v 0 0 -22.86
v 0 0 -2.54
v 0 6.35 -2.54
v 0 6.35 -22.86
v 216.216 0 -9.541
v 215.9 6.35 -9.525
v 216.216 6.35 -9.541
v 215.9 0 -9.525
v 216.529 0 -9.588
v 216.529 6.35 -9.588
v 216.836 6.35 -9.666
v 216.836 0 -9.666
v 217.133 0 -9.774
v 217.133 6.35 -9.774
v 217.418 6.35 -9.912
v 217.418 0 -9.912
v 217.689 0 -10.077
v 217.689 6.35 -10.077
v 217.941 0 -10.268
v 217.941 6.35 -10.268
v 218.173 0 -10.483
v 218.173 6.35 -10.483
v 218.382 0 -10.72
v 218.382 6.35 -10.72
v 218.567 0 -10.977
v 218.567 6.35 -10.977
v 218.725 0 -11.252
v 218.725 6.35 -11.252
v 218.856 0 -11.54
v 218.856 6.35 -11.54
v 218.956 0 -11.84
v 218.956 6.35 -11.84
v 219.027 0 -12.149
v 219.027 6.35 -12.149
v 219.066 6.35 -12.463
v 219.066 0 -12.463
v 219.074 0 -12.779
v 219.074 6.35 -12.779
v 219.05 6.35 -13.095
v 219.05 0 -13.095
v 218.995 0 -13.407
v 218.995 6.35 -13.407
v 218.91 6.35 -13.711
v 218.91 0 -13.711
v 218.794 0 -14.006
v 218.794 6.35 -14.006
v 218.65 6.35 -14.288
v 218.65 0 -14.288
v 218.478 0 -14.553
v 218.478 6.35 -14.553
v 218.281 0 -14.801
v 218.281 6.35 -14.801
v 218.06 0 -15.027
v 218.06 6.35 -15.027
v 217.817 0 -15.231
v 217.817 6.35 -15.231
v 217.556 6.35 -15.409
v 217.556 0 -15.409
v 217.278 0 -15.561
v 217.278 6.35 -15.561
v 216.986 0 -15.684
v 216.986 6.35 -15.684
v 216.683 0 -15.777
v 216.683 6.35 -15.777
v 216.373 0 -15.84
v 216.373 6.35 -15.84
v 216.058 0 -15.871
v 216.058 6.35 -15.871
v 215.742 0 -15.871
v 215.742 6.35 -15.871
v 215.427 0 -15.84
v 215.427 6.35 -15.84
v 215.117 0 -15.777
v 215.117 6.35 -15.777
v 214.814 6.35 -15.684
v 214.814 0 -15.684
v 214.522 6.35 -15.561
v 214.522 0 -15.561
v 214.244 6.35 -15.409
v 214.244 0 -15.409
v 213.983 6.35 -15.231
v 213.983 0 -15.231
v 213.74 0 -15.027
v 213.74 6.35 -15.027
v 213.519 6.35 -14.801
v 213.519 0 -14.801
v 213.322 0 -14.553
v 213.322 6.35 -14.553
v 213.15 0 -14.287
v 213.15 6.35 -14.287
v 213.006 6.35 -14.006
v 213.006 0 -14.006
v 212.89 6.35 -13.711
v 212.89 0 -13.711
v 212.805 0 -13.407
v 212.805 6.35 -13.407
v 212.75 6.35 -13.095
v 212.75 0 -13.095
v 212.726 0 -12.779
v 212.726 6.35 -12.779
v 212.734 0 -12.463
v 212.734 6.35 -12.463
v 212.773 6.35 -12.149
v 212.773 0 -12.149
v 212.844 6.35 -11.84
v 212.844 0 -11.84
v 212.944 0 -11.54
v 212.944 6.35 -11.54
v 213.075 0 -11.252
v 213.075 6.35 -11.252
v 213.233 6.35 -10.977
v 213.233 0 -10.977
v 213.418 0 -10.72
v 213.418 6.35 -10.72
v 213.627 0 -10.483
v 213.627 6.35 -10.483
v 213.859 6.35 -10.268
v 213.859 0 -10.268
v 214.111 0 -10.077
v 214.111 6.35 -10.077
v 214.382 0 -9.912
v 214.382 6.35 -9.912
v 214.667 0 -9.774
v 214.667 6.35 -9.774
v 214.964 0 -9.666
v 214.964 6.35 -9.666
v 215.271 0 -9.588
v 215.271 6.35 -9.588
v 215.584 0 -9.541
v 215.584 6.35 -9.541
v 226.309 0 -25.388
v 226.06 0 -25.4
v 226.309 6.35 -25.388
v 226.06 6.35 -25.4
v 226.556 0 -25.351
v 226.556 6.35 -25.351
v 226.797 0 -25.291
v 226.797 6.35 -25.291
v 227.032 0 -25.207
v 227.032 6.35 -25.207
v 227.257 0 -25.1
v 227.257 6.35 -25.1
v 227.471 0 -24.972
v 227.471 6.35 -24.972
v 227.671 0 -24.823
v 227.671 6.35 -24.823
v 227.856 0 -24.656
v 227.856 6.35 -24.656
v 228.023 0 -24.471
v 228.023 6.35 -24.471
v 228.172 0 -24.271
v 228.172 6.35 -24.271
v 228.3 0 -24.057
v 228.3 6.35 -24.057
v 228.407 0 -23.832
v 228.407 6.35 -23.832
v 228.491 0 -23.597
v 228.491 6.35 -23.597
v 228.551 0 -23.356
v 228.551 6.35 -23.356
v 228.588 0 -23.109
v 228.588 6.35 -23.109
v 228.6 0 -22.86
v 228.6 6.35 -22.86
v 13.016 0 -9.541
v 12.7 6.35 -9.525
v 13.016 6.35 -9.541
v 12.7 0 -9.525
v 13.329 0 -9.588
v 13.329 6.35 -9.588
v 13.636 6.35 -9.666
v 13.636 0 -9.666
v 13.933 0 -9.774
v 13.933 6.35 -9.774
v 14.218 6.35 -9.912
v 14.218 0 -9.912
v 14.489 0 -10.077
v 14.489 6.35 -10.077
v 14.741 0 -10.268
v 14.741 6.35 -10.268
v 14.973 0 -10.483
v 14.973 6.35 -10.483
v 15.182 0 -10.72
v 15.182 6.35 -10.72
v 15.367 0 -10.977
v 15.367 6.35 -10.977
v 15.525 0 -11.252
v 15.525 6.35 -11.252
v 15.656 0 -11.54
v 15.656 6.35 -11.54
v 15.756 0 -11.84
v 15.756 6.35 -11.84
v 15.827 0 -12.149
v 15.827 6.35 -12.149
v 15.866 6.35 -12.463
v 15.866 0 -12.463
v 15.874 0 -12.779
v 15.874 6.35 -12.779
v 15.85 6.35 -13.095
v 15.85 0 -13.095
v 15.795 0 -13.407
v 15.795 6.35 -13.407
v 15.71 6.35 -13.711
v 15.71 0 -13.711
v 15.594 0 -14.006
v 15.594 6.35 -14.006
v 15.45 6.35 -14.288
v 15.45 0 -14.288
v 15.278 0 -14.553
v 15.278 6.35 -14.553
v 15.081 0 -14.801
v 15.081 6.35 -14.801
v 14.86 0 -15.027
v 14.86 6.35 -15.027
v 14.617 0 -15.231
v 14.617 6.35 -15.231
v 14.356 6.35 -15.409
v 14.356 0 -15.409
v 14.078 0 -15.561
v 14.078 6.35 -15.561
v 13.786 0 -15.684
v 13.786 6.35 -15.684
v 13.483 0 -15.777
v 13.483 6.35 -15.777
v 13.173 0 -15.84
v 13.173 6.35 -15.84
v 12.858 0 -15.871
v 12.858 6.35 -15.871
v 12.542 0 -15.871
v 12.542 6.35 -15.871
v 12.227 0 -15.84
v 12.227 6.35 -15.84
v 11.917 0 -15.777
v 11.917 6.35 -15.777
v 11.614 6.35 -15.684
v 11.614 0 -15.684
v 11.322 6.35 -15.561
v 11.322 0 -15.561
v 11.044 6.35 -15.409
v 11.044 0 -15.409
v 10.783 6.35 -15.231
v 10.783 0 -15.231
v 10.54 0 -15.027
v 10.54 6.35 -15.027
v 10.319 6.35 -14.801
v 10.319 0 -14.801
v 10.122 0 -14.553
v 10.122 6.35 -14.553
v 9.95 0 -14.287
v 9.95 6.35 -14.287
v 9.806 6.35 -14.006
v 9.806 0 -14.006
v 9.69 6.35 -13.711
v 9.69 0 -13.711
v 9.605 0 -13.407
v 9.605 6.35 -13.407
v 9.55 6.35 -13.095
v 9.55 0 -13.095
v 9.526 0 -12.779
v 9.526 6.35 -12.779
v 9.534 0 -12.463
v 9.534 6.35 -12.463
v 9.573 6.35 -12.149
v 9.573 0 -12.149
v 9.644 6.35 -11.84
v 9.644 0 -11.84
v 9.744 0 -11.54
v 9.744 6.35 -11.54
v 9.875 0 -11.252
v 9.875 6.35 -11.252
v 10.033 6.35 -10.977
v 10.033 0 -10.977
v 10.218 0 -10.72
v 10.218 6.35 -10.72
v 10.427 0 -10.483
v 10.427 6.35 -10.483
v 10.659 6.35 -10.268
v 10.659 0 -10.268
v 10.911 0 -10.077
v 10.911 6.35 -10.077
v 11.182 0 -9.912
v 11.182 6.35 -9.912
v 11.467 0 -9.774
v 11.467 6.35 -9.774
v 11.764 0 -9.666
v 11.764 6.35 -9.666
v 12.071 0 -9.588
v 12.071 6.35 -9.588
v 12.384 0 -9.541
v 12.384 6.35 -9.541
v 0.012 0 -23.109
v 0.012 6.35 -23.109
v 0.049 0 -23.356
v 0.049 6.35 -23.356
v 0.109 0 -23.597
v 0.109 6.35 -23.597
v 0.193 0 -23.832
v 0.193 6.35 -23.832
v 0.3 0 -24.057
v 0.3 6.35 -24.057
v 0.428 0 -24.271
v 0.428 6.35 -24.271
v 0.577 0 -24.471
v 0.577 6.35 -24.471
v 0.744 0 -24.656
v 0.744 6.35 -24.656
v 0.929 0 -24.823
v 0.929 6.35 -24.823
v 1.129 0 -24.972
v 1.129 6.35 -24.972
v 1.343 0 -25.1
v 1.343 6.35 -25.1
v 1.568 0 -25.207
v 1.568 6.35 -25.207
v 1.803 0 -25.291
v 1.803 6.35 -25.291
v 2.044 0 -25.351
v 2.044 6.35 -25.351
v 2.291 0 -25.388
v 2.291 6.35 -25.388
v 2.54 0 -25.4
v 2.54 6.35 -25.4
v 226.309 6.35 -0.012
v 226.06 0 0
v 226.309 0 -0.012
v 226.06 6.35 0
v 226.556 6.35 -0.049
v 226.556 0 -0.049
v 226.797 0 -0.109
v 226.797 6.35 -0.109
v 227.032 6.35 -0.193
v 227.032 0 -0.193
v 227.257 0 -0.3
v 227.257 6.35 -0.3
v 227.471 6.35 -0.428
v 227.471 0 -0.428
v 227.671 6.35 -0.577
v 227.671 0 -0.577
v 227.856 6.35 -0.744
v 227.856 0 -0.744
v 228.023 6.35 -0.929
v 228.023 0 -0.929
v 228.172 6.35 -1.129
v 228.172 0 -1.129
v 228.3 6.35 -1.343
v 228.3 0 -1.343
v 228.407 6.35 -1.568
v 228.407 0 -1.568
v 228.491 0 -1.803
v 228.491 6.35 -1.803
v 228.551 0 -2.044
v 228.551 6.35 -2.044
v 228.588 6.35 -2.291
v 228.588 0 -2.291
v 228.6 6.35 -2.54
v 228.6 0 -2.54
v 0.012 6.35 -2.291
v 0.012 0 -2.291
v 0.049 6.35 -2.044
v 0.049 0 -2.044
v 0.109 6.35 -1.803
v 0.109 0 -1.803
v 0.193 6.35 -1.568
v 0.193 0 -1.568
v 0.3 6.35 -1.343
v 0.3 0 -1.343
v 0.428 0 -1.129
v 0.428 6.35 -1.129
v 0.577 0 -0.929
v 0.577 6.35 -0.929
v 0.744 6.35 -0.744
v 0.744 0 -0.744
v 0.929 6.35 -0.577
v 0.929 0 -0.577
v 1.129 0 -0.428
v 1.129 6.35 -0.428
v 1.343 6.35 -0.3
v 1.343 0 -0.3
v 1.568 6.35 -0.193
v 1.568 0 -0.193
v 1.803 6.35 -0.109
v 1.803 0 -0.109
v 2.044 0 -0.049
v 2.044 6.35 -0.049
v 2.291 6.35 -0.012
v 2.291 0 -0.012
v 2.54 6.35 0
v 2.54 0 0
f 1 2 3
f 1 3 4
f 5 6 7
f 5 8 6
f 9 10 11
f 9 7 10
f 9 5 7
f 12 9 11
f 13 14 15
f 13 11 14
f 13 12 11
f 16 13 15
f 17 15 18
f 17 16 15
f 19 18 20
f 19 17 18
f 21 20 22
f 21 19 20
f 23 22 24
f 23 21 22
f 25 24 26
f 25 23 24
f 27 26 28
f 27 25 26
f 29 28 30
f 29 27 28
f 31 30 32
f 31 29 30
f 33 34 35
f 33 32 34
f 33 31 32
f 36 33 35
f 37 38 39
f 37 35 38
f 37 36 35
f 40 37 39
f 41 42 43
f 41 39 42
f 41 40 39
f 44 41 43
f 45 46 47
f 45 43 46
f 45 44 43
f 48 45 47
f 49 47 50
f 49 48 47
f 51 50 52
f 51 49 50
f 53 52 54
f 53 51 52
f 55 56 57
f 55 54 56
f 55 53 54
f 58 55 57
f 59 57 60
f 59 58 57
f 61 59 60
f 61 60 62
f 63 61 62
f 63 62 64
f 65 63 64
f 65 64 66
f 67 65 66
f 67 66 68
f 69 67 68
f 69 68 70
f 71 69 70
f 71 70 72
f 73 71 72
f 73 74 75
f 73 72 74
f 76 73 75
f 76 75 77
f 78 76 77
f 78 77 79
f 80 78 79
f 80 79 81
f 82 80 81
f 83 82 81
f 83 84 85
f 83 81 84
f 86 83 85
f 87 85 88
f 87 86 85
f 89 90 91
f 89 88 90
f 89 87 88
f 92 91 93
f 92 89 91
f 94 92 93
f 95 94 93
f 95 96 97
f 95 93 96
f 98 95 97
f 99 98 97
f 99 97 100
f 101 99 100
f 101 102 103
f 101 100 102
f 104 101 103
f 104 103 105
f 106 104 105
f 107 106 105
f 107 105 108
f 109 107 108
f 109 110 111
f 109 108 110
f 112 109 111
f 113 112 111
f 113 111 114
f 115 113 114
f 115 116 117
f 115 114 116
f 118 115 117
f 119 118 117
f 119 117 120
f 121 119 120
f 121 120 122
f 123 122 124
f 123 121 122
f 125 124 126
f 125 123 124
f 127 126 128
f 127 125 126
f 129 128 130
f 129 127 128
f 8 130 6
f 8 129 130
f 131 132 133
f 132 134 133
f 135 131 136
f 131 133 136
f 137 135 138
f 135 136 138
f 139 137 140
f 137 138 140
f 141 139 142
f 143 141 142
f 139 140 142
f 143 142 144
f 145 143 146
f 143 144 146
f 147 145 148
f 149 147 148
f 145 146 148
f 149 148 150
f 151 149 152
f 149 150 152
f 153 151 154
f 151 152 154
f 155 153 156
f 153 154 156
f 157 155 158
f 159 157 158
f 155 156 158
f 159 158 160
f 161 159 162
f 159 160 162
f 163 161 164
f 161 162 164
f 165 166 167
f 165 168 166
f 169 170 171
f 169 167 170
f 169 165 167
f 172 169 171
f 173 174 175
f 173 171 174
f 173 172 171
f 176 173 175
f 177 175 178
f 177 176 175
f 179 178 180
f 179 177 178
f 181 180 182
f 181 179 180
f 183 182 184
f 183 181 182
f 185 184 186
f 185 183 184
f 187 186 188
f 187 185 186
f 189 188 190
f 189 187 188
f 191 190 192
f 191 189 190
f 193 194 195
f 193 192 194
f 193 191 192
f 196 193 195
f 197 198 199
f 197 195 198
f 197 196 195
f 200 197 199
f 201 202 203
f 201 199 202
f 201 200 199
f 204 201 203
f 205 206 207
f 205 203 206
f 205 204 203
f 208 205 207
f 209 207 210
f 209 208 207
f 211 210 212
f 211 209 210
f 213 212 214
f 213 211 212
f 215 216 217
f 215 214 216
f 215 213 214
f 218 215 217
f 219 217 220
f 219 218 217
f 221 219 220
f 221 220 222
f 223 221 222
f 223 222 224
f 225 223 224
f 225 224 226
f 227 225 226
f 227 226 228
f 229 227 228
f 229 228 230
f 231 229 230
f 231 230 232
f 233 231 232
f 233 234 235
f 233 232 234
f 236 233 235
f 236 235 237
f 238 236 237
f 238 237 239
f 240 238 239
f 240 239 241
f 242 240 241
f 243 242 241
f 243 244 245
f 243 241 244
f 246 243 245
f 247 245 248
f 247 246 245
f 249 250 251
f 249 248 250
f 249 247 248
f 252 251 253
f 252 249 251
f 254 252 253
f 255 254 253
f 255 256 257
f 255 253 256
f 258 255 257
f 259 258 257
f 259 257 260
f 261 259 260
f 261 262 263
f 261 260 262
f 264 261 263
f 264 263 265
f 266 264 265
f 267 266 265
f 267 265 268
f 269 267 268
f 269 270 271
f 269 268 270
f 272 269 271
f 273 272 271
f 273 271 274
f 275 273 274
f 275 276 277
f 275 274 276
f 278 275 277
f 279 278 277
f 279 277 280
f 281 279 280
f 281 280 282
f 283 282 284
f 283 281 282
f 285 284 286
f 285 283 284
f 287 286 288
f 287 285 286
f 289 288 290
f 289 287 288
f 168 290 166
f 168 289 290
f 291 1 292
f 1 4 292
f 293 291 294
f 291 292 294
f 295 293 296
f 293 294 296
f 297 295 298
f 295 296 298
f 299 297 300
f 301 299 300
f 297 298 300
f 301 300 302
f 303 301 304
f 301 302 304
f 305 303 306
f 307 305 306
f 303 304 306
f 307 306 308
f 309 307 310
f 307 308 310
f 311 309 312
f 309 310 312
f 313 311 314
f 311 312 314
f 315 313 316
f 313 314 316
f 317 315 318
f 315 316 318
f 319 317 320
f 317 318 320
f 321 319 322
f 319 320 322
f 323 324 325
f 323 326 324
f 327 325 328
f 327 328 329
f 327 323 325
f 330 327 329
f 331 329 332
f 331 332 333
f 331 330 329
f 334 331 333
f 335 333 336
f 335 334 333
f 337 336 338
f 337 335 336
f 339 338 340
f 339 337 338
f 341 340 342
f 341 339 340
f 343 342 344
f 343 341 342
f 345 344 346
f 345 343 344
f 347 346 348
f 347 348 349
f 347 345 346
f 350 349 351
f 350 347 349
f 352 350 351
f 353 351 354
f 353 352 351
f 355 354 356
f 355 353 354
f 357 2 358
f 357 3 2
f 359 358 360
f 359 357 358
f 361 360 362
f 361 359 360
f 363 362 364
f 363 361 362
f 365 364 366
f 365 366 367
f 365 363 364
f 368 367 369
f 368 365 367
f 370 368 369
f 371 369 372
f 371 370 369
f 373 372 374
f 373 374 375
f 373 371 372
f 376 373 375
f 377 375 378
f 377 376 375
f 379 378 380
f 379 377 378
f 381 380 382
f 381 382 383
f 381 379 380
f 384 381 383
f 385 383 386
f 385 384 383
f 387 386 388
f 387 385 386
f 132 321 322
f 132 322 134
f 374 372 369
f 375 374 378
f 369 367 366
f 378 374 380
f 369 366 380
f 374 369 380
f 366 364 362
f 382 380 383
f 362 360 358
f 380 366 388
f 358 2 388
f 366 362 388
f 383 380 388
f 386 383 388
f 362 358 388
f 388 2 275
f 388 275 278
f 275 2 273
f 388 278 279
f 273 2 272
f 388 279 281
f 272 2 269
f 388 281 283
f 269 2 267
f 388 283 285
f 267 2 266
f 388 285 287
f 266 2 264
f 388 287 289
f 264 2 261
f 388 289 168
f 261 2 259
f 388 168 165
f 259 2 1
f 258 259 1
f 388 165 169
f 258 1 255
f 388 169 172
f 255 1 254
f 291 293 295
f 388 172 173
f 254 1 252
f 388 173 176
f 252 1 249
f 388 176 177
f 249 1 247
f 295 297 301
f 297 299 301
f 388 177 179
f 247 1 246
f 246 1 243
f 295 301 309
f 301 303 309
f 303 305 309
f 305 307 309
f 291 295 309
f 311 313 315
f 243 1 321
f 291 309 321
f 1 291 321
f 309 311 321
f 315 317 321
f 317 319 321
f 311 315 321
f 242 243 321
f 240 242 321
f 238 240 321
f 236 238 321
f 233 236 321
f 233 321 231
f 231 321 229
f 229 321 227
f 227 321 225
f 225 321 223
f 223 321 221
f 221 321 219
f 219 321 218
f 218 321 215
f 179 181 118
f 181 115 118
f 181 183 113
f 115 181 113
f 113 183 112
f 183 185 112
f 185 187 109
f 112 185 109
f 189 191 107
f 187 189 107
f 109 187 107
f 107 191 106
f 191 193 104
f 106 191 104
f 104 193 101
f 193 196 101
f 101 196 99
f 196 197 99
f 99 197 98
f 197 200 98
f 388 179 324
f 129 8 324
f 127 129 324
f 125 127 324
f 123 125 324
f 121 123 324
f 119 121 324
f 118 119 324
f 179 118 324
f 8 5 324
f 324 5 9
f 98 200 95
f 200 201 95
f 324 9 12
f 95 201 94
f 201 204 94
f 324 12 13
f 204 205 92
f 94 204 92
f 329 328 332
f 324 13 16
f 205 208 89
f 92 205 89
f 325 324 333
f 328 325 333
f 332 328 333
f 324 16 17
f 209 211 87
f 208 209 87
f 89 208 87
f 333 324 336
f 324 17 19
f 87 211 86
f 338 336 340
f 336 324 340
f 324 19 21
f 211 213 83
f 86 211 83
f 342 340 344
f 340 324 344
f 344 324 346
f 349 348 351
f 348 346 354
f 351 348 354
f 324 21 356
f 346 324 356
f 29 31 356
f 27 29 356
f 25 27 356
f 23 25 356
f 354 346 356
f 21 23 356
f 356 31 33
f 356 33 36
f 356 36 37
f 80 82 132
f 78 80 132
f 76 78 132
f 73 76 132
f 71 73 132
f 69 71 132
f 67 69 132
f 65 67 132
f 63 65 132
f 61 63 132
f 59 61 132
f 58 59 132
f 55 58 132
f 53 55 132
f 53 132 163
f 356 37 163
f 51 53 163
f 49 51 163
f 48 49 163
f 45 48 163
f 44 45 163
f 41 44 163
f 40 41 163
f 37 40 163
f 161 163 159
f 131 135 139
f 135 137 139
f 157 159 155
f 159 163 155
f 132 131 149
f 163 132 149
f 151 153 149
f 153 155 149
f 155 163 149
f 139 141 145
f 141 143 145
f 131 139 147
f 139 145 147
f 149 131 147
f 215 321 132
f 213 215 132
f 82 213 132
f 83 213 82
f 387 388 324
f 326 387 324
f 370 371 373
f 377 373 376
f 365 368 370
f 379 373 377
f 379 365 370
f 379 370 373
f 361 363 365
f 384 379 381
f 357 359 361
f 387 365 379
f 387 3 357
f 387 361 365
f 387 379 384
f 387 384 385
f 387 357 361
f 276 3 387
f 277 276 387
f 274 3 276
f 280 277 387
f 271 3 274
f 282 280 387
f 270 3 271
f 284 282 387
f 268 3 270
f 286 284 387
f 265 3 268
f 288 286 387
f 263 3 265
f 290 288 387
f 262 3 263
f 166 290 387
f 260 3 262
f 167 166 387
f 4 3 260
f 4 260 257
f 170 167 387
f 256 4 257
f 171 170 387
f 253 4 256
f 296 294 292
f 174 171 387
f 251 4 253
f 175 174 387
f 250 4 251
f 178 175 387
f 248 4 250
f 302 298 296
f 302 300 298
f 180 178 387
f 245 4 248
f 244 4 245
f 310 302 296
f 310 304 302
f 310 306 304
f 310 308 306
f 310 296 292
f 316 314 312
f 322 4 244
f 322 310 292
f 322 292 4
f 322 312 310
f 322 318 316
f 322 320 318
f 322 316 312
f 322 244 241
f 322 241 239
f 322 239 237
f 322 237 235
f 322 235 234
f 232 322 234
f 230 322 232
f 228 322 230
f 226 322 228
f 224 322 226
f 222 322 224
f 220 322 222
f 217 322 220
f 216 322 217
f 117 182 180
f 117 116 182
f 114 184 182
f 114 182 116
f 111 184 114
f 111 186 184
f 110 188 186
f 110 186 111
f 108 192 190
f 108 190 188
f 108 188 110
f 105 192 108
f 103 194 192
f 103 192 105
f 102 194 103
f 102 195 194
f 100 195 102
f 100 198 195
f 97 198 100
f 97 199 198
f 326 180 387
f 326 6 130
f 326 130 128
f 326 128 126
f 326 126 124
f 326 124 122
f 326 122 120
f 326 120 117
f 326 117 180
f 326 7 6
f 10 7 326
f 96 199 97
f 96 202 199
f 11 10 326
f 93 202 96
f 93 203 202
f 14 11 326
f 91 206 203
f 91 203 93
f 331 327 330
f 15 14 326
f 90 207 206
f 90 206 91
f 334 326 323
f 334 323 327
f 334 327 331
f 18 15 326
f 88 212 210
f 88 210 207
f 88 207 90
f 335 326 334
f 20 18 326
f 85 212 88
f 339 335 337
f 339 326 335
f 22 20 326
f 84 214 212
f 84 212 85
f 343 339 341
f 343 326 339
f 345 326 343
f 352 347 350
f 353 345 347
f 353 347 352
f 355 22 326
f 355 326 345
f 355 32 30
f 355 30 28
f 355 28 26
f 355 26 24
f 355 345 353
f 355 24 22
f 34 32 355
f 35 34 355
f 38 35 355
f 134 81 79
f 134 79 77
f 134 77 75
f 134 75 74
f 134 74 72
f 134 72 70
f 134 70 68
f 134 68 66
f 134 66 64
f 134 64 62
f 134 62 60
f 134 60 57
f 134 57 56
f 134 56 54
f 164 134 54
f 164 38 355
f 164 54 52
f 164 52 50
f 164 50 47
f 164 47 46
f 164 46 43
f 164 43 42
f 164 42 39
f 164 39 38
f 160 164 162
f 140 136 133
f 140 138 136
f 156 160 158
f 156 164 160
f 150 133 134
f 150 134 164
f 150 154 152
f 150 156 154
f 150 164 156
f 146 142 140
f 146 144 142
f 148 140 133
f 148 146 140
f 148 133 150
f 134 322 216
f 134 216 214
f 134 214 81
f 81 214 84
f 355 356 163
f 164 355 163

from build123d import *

# Parameters (mm, degrees)
SKETCH1_W               = 228.6
SKETCH1_H               = 25.4
BOSS_EXTRUDE1_DEPTH     = 6.35
CUT_EXTRUDE1_DEPTH      = 231.094420836
CUT_EXTRUDE1_DEPTH_BACK = 231.094420836
SKETCH2_R               = 3.175
FILLET1_R               = 2.54


with BuildPart() as part:
    # Sketch1 → Boss-Extrude1 (new body)
    with BuildSketch(Plane(origin=(0, 0, 0), x_dir=(1, 0, 0), z_dir=(0, 1, 0))):
        with Locations((114.3, 12.7)):
            Rectangle(SKETCH1_W, SKETCH1_H)
    extrude(amount=BOSS_EXTRUDE1_DEPTH)

    # Sketch2 → Cut-Extrude1 (cut, two sides: drawn at the far end of the back side and taken through both)
    with BuildSketch(Plane(origin=(0, 6.35, 0), x_dir=(1, 0, 0), z_dir=(0, 1, 0)).offset(-CUT_EXTRUDE1_DEPTH_BACK)):
        with Locations(Location((12.7, 12.7, 0), (0, 0, 270))):
            Circle(SKETCH2_R)
        with Locations(Location((215.9, 12.7, 0), (0, 0, 270))):
            Circle(SKETCH2_R)
    extrude(amount=CUT_EXTRUDE1_DEPTH + CUT_EXTRUDE1_DEPTH_BACK, mode=Mode.SUBTRACT)

    # Fillet1
    fillet1_edges = [part.edges().sort_by_distance(p)[0] for p in [
        (0, 3.175, -25.4),
        (228.6, 3.175, -25.4),
        (228.6, 3.175, 0),
        (0, 3.175, 0),
    ]]
    fillet(fillet1_edges, radius=FILLET1_R)


solid = part.part
